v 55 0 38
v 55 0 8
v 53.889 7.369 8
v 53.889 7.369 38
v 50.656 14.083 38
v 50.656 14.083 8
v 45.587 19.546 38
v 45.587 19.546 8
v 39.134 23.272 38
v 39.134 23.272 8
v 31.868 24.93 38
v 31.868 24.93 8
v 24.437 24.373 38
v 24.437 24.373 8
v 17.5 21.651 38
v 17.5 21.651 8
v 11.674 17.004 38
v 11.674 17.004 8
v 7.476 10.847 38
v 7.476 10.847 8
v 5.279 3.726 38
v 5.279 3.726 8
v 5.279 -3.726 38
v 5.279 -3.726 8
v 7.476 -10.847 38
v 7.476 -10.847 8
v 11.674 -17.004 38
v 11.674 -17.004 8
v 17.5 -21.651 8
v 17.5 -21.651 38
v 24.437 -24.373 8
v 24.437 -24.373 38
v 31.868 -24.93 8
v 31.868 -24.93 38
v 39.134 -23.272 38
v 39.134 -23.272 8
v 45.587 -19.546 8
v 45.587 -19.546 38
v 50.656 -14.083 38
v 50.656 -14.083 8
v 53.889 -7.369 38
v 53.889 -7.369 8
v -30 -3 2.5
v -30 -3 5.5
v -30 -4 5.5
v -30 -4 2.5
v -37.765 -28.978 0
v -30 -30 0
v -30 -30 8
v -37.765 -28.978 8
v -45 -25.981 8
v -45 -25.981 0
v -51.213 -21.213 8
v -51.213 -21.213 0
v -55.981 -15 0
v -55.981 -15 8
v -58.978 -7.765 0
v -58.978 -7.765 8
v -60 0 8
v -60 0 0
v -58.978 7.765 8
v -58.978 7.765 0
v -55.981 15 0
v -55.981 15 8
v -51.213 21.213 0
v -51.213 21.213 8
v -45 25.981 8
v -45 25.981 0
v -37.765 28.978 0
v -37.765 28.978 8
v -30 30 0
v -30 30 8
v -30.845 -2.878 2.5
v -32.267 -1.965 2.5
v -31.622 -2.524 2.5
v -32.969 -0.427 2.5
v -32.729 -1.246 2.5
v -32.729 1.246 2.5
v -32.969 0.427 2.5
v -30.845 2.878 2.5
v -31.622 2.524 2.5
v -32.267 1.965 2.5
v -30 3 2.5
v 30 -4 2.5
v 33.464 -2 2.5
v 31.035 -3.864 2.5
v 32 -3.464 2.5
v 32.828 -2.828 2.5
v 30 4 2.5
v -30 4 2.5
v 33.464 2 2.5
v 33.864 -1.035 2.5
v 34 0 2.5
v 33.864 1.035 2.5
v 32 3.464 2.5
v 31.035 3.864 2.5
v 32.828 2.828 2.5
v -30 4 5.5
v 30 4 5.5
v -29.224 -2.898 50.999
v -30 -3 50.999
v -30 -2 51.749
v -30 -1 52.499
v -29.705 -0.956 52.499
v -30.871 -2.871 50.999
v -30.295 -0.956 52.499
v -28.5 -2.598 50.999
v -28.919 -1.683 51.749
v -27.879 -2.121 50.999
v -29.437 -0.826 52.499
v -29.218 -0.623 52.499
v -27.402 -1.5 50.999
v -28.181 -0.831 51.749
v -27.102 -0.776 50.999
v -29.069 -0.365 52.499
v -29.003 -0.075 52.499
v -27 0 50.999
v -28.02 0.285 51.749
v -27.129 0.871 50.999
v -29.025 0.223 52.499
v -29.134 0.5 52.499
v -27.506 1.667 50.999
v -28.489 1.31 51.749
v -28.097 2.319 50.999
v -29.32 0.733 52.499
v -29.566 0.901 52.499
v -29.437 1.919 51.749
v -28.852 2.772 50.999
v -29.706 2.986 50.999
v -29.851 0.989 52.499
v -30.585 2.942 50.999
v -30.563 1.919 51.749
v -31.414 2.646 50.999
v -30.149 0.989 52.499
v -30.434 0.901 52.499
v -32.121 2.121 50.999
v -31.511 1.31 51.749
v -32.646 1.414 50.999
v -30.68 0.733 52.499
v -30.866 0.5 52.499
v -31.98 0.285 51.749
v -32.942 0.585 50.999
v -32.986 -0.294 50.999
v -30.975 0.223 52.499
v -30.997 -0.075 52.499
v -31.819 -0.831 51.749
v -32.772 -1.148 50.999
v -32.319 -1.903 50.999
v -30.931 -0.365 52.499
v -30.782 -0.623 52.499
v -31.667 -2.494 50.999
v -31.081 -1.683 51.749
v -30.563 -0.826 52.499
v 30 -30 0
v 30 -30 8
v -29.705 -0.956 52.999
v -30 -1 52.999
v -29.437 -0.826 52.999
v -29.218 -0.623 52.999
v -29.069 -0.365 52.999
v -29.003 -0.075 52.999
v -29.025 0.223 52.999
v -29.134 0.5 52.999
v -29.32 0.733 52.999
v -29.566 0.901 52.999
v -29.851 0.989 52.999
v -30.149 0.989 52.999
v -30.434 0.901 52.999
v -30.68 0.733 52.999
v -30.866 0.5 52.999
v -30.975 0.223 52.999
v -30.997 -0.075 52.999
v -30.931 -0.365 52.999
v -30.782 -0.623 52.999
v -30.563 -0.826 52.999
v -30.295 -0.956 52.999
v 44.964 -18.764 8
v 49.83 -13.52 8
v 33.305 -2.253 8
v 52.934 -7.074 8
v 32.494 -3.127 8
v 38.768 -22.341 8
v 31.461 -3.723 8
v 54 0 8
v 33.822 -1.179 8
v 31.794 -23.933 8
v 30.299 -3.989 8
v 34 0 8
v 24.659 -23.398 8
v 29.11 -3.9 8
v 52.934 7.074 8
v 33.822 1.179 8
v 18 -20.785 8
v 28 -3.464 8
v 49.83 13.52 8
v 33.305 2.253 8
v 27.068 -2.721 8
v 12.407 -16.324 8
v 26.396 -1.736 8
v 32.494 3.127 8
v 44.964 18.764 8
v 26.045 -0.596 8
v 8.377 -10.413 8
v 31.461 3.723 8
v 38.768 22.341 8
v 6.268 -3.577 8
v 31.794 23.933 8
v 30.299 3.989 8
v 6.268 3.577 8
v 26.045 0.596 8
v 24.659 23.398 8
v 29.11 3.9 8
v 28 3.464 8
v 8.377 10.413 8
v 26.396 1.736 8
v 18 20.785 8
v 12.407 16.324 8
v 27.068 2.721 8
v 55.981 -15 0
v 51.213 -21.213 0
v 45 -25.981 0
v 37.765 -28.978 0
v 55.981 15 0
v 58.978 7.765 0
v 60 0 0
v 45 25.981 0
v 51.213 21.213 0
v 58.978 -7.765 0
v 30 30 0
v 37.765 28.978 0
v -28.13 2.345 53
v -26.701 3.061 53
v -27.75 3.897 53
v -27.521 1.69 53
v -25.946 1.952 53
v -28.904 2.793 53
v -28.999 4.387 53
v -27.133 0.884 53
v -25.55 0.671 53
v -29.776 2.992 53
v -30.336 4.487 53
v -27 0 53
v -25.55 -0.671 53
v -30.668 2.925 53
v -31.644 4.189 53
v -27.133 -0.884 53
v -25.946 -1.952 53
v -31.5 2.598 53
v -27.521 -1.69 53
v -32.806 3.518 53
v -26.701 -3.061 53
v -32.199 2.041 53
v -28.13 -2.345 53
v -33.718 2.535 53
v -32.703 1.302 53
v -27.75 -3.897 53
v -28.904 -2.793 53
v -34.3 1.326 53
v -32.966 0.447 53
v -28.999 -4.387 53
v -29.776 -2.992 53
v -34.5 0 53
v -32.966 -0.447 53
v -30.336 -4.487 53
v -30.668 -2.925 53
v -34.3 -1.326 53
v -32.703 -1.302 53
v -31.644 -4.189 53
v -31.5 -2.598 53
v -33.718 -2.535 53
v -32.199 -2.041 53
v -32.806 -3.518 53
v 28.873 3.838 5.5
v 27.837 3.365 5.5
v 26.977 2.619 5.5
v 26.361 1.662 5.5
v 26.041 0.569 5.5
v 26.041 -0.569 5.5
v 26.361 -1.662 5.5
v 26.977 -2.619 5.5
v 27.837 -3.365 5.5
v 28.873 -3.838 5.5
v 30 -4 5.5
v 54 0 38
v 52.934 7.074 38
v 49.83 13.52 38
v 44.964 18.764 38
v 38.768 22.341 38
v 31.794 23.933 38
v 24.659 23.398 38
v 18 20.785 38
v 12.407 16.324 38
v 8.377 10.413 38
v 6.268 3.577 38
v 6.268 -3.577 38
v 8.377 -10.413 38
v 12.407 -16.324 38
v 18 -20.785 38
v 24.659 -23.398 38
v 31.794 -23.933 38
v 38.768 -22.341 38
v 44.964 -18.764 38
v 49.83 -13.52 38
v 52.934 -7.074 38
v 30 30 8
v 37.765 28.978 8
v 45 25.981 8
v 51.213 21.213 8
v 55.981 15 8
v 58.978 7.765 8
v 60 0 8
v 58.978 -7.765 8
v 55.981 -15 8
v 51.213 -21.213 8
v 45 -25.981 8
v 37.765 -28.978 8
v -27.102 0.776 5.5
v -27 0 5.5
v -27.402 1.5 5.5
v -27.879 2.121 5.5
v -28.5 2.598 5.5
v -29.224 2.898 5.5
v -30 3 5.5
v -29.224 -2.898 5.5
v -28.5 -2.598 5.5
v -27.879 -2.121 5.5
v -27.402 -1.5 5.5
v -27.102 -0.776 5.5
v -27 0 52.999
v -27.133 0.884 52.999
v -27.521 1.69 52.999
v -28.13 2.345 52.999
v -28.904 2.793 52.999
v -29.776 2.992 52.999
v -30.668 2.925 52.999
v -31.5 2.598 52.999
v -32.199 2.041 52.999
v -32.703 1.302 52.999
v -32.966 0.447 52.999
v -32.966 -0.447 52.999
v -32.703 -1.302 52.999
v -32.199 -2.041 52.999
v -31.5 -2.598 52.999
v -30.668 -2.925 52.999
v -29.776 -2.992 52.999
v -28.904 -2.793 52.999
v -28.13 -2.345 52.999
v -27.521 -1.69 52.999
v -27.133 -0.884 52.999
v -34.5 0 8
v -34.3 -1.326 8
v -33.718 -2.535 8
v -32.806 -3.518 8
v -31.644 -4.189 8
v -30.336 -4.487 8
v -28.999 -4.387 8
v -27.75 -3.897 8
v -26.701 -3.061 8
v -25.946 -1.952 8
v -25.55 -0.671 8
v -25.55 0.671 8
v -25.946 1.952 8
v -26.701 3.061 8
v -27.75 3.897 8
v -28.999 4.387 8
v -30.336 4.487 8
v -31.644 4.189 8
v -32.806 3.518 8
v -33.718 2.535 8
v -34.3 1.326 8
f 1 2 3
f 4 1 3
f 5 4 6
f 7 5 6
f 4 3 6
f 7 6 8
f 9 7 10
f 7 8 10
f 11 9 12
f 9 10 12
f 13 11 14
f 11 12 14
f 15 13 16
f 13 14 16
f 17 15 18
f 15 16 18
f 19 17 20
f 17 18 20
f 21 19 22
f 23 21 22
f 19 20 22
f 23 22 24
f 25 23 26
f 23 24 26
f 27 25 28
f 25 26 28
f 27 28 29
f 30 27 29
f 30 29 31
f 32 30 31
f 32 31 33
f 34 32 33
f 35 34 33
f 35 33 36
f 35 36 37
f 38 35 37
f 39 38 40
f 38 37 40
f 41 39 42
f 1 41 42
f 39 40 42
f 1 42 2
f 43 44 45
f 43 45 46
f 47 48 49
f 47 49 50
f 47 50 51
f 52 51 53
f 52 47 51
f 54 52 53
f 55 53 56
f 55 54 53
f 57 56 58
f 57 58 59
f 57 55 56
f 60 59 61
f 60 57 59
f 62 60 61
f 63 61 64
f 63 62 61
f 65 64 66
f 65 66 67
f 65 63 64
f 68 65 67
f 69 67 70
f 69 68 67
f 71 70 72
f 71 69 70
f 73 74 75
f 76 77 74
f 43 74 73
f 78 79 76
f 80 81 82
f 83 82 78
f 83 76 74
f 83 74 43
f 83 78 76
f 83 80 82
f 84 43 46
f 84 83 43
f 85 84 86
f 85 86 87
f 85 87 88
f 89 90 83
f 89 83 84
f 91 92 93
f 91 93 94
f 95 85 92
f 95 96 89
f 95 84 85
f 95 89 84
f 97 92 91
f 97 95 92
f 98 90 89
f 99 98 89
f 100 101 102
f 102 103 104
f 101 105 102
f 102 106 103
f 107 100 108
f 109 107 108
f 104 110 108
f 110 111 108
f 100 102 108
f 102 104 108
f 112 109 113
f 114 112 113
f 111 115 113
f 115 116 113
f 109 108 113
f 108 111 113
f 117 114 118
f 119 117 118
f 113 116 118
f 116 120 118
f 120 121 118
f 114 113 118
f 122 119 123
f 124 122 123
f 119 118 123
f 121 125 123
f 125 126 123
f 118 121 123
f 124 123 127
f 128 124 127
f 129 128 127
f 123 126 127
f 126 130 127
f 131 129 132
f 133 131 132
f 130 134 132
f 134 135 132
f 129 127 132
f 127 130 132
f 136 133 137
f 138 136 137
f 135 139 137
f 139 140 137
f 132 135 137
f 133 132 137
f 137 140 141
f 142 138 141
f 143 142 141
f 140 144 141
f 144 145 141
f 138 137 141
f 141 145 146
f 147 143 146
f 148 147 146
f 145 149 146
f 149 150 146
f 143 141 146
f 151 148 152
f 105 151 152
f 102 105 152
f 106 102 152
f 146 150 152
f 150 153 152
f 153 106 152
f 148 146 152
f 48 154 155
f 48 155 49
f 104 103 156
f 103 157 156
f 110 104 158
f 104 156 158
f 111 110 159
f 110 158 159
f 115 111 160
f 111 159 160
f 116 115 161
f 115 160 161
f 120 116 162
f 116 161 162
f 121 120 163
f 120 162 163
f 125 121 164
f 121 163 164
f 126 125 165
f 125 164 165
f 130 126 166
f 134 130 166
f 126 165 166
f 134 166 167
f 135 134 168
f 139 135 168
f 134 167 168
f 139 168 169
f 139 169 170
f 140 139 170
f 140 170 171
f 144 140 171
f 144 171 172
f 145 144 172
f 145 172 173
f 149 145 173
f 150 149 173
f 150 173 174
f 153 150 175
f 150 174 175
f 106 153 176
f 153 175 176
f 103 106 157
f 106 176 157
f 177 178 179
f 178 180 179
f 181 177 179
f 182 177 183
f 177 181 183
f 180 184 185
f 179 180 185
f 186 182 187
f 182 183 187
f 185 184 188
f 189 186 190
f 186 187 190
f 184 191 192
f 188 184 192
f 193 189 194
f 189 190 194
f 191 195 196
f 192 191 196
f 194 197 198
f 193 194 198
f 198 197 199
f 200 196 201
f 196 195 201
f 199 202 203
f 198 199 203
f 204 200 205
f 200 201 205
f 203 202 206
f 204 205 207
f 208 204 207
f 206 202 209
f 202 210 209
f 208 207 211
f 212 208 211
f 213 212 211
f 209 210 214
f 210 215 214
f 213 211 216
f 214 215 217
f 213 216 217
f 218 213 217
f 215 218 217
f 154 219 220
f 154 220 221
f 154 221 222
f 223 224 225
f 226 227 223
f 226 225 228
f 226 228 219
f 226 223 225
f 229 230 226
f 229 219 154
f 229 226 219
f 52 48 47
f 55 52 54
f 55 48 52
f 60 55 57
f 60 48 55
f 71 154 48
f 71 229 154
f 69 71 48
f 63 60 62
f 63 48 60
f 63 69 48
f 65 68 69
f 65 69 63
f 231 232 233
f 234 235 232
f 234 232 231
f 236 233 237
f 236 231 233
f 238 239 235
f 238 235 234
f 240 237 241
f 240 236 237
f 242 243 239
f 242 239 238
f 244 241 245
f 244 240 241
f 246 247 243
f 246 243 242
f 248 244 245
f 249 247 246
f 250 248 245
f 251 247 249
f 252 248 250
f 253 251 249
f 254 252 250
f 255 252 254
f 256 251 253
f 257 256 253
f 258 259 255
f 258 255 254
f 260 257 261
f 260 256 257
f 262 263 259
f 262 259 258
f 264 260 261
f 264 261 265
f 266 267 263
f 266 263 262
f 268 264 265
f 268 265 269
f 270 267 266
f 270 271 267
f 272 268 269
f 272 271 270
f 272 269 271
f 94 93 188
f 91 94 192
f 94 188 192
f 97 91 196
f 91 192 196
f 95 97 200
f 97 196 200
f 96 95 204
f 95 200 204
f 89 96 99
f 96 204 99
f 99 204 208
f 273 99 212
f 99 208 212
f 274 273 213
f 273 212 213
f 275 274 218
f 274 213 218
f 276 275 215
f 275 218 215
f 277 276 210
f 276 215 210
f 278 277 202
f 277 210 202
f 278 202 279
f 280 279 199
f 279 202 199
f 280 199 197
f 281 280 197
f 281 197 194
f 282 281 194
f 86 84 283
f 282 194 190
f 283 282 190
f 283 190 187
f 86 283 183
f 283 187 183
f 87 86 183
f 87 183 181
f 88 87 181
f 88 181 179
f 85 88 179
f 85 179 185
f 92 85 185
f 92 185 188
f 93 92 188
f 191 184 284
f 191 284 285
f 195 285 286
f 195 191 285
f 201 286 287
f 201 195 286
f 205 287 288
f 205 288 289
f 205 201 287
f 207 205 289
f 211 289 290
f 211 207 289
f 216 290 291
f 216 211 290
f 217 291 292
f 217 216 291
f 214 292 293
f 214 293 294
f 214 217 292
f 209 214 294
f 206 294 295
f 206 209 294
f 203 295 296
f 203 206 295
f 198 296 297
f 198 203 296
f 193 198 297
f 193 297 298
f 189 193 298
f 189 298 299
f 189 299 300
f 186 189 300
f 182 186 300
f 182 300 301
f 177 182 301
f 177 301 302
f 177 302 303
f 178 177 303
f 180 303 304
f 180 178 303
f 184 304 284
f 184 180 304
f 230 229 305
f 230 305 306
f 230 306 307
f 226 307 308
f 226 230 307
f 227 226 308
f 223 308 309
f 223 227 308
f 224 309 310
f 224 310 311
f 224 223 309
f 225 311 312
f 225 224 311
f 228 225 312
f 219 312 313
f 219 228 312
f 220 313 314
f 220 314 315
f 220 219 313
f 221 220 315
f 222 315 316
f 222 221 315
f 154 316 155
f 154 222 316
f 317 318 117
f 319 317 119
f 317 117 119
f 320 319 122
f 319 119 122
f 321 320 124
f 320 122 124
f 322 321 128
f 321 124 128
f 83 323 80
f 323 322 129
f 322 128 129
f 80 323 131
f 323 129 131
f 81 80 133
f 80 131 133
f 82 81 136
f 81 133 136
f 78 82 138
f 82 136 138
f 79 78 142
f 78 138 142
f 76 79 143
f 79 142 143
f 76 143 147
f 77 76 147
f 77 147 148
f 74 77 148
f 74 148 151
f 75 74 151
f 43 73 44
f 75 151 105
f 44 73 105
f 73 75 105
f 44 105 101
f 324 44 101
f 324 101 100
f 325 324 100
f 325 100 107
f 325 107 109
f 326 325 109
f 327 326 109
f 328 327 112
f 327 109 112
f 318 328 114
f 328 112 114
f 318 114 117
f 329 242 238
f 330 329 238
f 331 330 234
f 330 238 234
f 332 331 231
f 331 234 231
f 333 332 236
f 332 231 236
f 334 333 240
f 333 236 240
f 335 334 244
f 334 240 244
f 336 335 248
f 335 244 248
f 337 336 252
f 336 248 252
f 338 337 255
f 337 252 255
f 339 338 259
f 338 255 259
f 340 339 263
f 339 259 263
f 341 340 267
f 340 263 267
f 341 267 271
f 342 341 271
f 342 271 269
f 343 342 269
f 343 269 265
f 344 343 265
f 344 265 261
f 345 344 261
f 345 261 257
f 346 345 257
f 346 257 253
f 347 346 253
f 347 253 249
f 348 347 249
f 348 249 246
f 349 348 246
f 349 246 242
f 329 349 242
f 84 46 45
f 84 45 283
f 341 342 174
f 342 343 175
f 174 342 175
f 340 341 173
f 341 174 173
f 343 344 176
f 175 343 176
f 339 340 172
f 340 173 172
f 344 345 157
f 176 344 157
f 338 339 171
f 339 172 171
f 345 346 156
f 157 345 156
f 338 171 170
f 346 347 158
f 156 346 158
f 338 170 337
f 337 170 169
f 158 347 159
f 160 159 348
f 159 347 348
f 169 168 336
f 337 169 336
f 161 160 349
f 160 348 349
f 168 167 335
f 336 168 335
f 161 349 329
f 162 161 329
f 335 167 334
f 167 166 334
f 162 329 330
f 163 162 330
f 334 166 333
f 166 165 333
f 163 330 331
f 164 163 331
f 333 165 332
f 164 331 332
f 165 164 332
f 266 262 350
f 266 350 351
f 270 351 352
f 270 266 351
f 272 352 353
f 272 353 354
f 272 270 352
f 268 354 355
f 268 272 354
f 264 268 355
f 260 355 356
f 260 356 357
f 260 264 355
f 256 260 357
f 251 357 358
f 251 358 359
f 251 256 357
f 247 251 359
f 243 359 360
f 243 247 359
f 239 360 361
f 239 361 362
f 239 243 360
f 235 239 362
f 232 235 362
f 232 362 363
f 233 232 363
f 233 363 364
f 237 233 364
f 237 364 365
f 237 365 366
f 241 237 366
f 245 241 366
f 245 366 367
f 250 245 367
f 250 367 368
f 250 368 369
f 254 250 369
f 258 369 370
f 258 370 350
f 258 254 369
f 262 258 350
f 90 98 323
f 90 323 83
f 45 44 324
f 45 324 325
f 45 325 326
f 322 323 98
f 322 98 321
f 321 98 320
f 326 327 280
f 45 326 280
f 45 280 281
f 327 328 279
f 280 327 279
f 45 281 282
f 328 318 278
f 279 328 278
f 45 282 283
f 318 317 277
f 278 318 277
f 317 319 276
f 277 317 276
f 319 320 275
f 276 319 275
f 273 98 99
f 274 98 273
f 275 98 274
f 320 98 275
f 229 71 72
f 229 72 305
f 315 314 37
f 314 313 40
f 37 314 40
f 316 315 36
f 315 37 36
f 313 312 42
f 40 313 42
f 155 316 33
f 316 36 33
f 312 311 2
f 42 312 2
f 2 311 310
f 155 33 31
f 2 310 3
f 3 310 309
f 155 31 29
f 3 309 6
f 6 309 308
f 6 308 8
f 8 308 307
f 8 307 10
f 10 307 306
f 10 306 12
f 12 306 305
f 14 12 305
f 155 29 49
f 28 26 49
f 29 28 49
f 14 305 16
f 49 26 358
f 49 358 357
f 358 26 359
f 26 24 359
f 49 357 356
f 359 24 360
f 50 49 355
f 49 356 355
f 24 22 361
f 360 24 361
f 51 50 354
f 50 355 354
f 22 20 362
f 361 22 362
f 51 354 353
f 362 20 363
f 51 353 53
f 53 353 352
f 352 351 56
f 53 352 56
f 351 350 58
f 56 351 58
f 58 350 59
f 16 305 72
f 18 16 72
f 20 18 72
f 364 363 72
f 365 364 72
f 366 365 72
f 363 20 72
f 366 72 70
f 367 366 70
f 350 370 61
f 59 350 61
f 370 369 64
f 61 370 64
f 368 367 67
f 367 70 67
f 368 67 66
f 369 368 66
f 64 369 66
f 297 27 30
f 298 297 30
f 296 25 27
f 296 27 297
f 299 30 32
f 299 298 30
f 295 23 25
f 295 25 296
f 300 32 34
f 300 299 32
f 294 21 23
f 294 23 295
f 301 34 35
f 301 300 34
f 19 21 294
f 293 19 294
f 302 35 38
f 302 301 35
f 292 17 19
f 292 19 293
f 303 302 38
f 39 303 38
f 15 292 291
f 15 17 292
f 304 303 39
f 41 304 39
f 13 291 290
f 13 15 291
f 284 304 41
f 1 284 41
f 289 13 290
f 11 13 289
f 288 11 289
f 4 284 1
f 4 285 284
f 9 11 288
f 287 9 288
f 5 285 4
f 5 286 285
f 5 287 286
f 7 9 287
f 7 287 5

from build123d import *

# Parameters (mm, degrees)
BOSS_EXTRUDE1_DEPTH = 8
SKETCH2_W           = 60
SKETCH2_H           = 3
CUT_EXTRUDE1_DEPTH  = 4
SKETCH3_R           = 4
SKETCH3_R_2         = 3
CUT_EXTRUDE3_DEPTH  = 5.5
BOSS_EXTRUDE3_START = 45
SKETCH4_R           = 4.5
SKETCH4_R_2         = 3
BOSS_EXTRUDE3_DEPTH = 45
SKETCH6_R           = 25
SKETCH6_R_2         = 24
BOSS_EXTRUDE4_DEPTH = 30


with BuildPart() as part:
    # Sketch1 → Boss-Extrude1 (new body)
    with BuildSketch(Plane.XY):
        with BuildLine():
            Line((-30, 30), (30, 30))
            ThreePointArc((30, 30), (60, 0), (30, -30))
            Line((30, -30), (-30, -30))
            ThreePointArc((-30, -30), (-60, 0), (-30, 30))
        make_face()
    extrude(amount=BOSS_EXTRUDE1_DEPTH)

    # Sketch2 → Cut-Extrude1 (cut, symmetric)
    with BuildSketch(Plane(origin=(0, 0, 0), x_dir=(1, 0, 0), z_dir=(0, 1, 0))):
        with Locations((0, -4)):
            Rectangle(SKETCH2_W, SKETCH2_H)
    extrude(amount=CUT_EXTRUDE1_DEPTH, both=True, mode=Mode.SUBTRACT)

    # Sketch3 → Cut-Extrude3 (cut)
    with BuildSketch(Plane.XY.offset(8)):
        with Locations((30, 0)):
            Circle(SKETCH3_R)
        with Locations((-30, 0)):
            Circle(SKETCH3_R_2)
    extrude(amount=-CUT_EXTRUDE3_DEPTH, mode=Mode.SUBTRACT)

    # Sketch4 → Boss-Extrude3 (add)
    with BuildSketch(Plane.XY.offset(8).offset(BOSS_EXTRUDE3_START)):
        with Locations(Location((-30, 0, 0), (0, 0, 180))):
            Circle(SKETCH4_R)
        with Locations((-30, 0)):
            Circle(SKETCH4_R_2, mode=Mode.SUBTRACT)
    extrude(amount=-BOSS_EXTRUDE3_DEPTH)

    # Sketch5 → Revolve1 (revolve)
    with BuildSketch(Plane(origin=(0, 0, 0), x_dir=(1, 0, 0), z_dir=(0, 1, 0)), mode=Mode.PRIVATE) as revolve1_sk:
        Polygon((-33, -52.999308425), (-33, -50.999308425), (-31, -52.499308425), (-31, -52.999308425), align=None)
    revolve(revolve1_sk.sketch.rotate(Axis((-30, 0, 53), (0, 0, 1)), 90), axis=Axis((-30, 0, 53), (0, 0, 1)))

    # Sketch6 → Boss-Extrude4 (add)
    with BuildSketch(Plane.XY.offset(8)):
        with Locations((30, 0)):
            Circle(SKETCH6_R)
        with Locations((30, 0)):
            Circle(SKETCH6_R_2, mode=Mode.SUBTRACT)
    extrude(amount=BOSS_EXTRUDE4_DEPTH)


solid = part.part
